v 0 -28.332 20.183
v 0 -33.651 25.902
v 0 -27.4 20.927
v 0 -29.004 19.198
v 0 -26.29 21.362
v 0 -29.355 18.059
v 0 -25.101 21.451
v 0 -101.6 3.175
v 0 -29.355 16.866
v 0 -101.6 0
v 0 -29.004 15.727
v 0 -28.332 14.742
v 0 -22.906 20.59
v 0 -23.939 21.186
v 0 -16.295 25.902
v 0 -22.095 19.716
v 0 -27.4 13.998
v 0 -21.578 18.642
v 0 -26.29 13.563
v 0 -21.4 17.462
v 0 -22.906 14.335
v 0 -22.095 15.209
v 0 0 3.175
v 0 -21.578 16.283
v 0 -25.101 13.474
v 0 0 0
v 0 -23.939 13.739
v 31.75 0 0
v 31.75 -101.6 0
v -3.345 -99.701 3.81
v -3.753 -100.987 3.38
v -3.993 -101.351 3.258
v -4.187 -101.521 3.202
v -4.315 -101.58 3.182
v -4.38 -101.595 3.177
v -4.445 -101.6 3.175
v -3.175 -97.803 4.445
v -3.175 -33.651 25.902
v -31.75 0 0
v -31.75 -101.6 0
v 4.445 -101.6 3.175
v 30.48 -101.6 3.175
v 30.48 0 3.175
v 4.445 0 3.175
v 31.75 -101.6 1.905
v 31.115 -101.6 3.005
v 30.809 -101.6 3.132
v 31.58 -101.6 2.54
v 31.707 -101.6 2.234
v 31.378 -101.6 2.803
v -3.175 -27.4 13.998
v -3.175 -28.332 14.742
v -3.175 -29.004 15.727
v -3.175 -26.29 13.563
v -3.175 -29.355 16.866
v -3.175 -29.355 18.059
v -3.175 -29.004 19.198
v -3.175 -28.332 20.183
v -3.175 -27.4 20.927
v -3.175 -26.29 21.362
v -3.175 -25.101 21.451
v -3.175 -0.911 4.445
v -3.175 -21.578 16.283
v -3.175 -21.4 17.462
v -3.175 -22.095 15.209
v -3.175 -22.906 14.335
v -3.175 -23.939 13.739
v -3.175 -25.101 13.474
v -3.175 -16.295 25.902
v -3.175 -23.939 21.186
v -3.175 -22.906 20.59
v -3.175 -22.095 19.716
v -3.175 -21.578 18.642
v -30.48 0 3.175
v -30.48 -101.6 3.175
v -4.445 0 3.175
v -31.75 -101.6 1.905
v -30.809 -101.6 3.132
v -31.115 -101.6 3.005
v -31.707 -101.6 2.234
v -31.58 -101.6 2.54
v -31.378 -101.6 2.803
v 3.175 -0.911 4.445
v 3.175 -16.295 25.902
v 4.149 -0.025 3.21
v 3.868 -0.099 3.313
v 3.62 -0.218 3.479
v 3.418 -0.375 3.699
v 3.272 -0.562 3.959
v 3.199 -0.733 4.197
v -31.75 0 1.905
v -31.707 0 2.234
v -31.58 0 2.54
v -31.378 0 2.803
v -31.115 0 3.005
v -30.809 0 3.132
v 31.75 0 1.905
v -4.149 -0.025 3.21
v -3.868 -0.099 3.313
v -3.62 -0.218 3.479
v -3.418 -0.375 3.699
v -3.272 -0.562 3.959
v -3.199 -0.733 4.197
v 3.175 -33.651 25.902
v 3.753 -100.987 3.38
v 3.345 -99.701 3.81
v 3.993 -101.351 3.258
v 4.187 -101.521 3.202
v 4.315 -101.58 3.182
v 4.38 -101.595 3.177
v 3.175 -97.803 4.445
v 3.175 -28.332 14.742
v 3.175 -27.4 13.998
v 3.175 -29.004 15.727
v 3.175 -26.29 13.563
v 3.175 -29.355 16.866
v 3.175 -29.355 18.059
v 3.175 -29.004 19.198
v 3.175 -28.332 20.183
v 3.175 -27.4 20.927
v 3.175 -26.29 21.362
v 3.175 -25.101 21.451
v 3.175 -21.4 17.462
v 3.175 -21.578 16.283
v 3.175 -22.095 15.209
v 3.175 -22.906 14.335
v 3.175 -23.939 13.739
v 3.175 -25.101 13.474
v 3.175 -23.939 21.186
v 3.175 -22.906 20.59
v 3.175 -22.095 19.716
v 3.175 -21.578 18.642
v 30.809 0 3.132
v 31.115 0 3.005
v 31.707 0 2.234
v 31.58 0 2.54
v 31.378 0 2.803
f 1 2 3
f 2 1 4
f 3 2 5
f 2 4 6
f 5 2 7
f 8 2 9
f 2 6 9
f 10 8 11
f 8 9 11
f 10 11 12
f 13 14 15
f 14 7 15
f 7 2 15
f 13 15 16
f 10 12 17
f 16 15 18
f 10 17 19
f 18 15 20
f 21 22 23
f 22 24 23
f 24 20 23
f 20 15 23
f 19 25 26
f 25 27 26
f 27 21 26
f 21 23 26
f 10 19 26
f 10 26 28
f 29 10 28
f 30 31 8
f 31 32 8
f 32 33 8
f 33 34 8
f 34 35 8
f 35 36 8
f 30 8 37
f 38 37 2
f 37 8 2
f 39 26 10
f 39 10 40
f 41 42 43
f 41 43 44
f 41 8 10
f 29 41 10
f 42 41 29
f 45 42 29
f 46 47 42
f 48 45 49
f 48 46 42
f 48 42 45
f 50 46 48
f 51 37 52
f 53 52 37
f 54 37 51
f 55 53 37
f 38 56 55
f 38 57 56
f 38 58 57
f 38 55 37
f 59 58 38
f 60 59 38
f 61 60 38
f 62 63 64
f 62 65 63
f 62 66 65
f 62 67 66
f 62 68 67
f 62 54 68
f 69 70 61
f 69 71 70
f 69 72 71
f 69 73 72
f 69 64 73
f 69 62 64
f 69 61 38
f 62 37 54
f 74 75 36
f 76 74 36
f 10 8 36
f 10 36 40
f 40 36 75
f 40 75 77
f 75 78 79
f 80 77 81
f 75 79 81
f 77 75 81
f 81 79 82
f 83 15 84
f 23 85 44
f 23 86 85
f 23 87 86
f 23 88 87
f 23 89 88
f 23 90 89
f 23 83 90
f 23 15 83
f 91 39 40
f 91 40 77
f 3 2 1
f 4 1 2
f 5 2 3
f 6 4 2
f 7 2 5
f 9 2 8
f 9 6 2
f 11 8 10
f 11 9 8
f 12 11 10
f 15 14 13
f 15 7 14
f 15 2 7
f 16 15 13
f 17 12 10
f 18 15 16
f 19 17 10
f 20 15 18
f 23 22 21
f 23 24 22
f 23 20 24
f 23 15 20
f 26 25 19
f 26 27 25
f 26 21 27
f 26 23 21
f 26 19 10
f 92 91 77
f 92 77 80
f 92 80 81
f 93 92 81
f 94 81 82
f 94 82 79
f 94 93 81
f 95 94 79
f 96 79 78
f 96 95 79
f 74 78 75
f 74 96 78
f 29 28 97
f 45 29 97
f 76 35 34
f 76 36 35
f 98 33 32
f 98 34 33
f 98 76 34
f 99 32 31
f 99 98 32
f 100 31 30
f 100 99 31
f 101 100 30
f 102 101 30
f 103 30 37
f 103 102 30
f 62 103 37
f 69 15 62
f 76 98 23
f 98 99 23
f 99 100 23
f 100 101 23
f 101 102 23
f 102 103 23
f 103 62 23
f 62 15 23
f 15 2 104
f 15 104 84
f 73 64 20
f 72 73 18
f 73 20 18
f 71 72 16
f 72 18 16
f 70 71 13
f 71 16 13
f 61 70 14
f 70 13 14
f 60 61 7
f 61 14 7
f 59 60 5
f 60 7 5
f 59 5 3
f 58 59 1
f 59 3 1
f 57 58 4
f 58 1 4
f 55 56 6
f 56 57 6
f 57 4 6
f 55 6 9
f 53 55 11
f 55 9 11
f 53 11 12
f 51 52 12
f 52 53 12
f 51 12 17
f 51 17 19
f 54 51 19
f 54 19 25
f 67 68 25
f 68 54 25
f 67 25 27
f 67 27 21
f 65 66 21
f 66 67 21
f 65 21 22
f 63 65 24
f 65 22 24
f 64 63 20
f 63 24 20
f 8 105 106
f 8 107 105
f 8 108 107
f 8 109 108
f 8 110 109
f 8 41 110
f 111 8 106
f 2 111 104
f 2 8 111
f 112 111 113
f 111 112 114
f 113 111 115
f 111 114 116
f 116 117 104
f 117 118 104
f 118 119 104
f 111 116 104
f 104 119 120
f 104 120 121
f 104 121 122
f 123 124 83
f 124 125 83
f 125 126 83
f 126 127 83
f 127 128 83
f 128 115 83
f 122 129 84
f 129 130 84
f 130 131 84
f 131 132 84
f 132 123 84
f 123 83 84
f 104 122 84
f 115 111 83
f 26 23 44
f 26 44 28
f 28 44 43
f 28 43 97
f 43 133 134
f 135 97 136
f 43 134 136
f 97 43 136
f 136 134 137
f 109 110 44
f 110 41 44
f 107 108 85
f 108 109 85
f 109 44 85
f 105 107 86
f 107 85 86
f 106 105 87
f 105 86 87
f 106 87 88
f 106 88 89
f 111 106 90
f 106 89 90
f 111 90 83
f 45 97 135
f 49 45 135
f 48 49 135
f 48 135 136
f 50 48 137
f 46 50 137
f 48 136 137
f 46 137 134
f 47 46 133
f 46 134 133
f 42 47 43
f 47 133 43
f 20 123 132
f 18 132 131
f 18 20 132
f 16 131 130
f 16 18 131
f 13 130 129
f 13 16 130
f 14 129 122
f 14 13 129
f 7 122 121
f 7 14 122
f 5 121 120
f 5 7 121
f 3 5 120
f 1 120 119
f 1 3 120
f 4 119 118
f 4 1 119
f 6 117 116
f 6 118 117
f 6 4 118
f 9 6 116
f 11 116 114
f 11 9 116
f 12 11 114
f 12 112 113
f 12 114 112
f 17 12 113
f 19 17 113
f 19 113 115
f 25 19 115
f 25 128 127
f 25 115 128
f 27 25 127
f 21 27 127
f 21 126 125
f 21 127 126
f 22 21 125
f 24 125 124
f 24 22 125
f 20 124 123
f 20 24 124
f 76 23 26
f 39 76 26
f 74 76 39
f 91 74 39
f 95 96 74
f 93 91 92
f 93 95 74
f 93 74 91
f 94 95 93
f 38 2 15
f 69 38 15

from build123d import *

# Parameters (mm, degrees)
F1_DEPTH = 101.6
F2_R     = 4
F3_DEPTH = 31.751


with BuildPart() as f1:
    # F0 (on Front) → F1 (new body)
    with BuildSketch(Plane.XZ):
        with BuildLine():
            Line((0, 31.75), (0, 0))
            Line((0, 0), (31.75, 0))
            Line((31.75, 0), (31.75, 1.905))
            ThreePointArc((31.75, 1.905), (31.378026, 2.803026), (30.48, 3.175))
            Line((30.48, 3.175), (4.445, 3.175))
            ThreePointArc((4.445, 3.175), (3.546974, 3.546974), (3.175, 4.445))
            Line((3.175, 4.445), (3.175, 30.48))
            ThreePointArc((3.175, 30.48), (2.803026, 31.378026), (1.905, 31.75))
            Line((1.905, 31.75), (0, 31.75))
        make_face()
    extrude(amount=F1_DEPTH)

    # F2 (on Right) → F3 (cut, through all)
    with BuildSketch(Plane.YZ):
        with Locations((-25.4, 17.4625)):
            Circle(F2_R)
        Polygon((-101.6, 3.175), (-33.650886, 25.901856), (-16.294748, 25.901856), (0, 3.175), (0, 31.75), (-101.6, 31.75), align=None)
    extrude(amount=F3_DEPTH, mode=Mode.SUBTRACT)


with BuildPart() as f4_1:
    # F4: instance of F1
    add(f1.part.mirror(Plane.YZ))


solid = Compound([f1.part, f4_1.part])
